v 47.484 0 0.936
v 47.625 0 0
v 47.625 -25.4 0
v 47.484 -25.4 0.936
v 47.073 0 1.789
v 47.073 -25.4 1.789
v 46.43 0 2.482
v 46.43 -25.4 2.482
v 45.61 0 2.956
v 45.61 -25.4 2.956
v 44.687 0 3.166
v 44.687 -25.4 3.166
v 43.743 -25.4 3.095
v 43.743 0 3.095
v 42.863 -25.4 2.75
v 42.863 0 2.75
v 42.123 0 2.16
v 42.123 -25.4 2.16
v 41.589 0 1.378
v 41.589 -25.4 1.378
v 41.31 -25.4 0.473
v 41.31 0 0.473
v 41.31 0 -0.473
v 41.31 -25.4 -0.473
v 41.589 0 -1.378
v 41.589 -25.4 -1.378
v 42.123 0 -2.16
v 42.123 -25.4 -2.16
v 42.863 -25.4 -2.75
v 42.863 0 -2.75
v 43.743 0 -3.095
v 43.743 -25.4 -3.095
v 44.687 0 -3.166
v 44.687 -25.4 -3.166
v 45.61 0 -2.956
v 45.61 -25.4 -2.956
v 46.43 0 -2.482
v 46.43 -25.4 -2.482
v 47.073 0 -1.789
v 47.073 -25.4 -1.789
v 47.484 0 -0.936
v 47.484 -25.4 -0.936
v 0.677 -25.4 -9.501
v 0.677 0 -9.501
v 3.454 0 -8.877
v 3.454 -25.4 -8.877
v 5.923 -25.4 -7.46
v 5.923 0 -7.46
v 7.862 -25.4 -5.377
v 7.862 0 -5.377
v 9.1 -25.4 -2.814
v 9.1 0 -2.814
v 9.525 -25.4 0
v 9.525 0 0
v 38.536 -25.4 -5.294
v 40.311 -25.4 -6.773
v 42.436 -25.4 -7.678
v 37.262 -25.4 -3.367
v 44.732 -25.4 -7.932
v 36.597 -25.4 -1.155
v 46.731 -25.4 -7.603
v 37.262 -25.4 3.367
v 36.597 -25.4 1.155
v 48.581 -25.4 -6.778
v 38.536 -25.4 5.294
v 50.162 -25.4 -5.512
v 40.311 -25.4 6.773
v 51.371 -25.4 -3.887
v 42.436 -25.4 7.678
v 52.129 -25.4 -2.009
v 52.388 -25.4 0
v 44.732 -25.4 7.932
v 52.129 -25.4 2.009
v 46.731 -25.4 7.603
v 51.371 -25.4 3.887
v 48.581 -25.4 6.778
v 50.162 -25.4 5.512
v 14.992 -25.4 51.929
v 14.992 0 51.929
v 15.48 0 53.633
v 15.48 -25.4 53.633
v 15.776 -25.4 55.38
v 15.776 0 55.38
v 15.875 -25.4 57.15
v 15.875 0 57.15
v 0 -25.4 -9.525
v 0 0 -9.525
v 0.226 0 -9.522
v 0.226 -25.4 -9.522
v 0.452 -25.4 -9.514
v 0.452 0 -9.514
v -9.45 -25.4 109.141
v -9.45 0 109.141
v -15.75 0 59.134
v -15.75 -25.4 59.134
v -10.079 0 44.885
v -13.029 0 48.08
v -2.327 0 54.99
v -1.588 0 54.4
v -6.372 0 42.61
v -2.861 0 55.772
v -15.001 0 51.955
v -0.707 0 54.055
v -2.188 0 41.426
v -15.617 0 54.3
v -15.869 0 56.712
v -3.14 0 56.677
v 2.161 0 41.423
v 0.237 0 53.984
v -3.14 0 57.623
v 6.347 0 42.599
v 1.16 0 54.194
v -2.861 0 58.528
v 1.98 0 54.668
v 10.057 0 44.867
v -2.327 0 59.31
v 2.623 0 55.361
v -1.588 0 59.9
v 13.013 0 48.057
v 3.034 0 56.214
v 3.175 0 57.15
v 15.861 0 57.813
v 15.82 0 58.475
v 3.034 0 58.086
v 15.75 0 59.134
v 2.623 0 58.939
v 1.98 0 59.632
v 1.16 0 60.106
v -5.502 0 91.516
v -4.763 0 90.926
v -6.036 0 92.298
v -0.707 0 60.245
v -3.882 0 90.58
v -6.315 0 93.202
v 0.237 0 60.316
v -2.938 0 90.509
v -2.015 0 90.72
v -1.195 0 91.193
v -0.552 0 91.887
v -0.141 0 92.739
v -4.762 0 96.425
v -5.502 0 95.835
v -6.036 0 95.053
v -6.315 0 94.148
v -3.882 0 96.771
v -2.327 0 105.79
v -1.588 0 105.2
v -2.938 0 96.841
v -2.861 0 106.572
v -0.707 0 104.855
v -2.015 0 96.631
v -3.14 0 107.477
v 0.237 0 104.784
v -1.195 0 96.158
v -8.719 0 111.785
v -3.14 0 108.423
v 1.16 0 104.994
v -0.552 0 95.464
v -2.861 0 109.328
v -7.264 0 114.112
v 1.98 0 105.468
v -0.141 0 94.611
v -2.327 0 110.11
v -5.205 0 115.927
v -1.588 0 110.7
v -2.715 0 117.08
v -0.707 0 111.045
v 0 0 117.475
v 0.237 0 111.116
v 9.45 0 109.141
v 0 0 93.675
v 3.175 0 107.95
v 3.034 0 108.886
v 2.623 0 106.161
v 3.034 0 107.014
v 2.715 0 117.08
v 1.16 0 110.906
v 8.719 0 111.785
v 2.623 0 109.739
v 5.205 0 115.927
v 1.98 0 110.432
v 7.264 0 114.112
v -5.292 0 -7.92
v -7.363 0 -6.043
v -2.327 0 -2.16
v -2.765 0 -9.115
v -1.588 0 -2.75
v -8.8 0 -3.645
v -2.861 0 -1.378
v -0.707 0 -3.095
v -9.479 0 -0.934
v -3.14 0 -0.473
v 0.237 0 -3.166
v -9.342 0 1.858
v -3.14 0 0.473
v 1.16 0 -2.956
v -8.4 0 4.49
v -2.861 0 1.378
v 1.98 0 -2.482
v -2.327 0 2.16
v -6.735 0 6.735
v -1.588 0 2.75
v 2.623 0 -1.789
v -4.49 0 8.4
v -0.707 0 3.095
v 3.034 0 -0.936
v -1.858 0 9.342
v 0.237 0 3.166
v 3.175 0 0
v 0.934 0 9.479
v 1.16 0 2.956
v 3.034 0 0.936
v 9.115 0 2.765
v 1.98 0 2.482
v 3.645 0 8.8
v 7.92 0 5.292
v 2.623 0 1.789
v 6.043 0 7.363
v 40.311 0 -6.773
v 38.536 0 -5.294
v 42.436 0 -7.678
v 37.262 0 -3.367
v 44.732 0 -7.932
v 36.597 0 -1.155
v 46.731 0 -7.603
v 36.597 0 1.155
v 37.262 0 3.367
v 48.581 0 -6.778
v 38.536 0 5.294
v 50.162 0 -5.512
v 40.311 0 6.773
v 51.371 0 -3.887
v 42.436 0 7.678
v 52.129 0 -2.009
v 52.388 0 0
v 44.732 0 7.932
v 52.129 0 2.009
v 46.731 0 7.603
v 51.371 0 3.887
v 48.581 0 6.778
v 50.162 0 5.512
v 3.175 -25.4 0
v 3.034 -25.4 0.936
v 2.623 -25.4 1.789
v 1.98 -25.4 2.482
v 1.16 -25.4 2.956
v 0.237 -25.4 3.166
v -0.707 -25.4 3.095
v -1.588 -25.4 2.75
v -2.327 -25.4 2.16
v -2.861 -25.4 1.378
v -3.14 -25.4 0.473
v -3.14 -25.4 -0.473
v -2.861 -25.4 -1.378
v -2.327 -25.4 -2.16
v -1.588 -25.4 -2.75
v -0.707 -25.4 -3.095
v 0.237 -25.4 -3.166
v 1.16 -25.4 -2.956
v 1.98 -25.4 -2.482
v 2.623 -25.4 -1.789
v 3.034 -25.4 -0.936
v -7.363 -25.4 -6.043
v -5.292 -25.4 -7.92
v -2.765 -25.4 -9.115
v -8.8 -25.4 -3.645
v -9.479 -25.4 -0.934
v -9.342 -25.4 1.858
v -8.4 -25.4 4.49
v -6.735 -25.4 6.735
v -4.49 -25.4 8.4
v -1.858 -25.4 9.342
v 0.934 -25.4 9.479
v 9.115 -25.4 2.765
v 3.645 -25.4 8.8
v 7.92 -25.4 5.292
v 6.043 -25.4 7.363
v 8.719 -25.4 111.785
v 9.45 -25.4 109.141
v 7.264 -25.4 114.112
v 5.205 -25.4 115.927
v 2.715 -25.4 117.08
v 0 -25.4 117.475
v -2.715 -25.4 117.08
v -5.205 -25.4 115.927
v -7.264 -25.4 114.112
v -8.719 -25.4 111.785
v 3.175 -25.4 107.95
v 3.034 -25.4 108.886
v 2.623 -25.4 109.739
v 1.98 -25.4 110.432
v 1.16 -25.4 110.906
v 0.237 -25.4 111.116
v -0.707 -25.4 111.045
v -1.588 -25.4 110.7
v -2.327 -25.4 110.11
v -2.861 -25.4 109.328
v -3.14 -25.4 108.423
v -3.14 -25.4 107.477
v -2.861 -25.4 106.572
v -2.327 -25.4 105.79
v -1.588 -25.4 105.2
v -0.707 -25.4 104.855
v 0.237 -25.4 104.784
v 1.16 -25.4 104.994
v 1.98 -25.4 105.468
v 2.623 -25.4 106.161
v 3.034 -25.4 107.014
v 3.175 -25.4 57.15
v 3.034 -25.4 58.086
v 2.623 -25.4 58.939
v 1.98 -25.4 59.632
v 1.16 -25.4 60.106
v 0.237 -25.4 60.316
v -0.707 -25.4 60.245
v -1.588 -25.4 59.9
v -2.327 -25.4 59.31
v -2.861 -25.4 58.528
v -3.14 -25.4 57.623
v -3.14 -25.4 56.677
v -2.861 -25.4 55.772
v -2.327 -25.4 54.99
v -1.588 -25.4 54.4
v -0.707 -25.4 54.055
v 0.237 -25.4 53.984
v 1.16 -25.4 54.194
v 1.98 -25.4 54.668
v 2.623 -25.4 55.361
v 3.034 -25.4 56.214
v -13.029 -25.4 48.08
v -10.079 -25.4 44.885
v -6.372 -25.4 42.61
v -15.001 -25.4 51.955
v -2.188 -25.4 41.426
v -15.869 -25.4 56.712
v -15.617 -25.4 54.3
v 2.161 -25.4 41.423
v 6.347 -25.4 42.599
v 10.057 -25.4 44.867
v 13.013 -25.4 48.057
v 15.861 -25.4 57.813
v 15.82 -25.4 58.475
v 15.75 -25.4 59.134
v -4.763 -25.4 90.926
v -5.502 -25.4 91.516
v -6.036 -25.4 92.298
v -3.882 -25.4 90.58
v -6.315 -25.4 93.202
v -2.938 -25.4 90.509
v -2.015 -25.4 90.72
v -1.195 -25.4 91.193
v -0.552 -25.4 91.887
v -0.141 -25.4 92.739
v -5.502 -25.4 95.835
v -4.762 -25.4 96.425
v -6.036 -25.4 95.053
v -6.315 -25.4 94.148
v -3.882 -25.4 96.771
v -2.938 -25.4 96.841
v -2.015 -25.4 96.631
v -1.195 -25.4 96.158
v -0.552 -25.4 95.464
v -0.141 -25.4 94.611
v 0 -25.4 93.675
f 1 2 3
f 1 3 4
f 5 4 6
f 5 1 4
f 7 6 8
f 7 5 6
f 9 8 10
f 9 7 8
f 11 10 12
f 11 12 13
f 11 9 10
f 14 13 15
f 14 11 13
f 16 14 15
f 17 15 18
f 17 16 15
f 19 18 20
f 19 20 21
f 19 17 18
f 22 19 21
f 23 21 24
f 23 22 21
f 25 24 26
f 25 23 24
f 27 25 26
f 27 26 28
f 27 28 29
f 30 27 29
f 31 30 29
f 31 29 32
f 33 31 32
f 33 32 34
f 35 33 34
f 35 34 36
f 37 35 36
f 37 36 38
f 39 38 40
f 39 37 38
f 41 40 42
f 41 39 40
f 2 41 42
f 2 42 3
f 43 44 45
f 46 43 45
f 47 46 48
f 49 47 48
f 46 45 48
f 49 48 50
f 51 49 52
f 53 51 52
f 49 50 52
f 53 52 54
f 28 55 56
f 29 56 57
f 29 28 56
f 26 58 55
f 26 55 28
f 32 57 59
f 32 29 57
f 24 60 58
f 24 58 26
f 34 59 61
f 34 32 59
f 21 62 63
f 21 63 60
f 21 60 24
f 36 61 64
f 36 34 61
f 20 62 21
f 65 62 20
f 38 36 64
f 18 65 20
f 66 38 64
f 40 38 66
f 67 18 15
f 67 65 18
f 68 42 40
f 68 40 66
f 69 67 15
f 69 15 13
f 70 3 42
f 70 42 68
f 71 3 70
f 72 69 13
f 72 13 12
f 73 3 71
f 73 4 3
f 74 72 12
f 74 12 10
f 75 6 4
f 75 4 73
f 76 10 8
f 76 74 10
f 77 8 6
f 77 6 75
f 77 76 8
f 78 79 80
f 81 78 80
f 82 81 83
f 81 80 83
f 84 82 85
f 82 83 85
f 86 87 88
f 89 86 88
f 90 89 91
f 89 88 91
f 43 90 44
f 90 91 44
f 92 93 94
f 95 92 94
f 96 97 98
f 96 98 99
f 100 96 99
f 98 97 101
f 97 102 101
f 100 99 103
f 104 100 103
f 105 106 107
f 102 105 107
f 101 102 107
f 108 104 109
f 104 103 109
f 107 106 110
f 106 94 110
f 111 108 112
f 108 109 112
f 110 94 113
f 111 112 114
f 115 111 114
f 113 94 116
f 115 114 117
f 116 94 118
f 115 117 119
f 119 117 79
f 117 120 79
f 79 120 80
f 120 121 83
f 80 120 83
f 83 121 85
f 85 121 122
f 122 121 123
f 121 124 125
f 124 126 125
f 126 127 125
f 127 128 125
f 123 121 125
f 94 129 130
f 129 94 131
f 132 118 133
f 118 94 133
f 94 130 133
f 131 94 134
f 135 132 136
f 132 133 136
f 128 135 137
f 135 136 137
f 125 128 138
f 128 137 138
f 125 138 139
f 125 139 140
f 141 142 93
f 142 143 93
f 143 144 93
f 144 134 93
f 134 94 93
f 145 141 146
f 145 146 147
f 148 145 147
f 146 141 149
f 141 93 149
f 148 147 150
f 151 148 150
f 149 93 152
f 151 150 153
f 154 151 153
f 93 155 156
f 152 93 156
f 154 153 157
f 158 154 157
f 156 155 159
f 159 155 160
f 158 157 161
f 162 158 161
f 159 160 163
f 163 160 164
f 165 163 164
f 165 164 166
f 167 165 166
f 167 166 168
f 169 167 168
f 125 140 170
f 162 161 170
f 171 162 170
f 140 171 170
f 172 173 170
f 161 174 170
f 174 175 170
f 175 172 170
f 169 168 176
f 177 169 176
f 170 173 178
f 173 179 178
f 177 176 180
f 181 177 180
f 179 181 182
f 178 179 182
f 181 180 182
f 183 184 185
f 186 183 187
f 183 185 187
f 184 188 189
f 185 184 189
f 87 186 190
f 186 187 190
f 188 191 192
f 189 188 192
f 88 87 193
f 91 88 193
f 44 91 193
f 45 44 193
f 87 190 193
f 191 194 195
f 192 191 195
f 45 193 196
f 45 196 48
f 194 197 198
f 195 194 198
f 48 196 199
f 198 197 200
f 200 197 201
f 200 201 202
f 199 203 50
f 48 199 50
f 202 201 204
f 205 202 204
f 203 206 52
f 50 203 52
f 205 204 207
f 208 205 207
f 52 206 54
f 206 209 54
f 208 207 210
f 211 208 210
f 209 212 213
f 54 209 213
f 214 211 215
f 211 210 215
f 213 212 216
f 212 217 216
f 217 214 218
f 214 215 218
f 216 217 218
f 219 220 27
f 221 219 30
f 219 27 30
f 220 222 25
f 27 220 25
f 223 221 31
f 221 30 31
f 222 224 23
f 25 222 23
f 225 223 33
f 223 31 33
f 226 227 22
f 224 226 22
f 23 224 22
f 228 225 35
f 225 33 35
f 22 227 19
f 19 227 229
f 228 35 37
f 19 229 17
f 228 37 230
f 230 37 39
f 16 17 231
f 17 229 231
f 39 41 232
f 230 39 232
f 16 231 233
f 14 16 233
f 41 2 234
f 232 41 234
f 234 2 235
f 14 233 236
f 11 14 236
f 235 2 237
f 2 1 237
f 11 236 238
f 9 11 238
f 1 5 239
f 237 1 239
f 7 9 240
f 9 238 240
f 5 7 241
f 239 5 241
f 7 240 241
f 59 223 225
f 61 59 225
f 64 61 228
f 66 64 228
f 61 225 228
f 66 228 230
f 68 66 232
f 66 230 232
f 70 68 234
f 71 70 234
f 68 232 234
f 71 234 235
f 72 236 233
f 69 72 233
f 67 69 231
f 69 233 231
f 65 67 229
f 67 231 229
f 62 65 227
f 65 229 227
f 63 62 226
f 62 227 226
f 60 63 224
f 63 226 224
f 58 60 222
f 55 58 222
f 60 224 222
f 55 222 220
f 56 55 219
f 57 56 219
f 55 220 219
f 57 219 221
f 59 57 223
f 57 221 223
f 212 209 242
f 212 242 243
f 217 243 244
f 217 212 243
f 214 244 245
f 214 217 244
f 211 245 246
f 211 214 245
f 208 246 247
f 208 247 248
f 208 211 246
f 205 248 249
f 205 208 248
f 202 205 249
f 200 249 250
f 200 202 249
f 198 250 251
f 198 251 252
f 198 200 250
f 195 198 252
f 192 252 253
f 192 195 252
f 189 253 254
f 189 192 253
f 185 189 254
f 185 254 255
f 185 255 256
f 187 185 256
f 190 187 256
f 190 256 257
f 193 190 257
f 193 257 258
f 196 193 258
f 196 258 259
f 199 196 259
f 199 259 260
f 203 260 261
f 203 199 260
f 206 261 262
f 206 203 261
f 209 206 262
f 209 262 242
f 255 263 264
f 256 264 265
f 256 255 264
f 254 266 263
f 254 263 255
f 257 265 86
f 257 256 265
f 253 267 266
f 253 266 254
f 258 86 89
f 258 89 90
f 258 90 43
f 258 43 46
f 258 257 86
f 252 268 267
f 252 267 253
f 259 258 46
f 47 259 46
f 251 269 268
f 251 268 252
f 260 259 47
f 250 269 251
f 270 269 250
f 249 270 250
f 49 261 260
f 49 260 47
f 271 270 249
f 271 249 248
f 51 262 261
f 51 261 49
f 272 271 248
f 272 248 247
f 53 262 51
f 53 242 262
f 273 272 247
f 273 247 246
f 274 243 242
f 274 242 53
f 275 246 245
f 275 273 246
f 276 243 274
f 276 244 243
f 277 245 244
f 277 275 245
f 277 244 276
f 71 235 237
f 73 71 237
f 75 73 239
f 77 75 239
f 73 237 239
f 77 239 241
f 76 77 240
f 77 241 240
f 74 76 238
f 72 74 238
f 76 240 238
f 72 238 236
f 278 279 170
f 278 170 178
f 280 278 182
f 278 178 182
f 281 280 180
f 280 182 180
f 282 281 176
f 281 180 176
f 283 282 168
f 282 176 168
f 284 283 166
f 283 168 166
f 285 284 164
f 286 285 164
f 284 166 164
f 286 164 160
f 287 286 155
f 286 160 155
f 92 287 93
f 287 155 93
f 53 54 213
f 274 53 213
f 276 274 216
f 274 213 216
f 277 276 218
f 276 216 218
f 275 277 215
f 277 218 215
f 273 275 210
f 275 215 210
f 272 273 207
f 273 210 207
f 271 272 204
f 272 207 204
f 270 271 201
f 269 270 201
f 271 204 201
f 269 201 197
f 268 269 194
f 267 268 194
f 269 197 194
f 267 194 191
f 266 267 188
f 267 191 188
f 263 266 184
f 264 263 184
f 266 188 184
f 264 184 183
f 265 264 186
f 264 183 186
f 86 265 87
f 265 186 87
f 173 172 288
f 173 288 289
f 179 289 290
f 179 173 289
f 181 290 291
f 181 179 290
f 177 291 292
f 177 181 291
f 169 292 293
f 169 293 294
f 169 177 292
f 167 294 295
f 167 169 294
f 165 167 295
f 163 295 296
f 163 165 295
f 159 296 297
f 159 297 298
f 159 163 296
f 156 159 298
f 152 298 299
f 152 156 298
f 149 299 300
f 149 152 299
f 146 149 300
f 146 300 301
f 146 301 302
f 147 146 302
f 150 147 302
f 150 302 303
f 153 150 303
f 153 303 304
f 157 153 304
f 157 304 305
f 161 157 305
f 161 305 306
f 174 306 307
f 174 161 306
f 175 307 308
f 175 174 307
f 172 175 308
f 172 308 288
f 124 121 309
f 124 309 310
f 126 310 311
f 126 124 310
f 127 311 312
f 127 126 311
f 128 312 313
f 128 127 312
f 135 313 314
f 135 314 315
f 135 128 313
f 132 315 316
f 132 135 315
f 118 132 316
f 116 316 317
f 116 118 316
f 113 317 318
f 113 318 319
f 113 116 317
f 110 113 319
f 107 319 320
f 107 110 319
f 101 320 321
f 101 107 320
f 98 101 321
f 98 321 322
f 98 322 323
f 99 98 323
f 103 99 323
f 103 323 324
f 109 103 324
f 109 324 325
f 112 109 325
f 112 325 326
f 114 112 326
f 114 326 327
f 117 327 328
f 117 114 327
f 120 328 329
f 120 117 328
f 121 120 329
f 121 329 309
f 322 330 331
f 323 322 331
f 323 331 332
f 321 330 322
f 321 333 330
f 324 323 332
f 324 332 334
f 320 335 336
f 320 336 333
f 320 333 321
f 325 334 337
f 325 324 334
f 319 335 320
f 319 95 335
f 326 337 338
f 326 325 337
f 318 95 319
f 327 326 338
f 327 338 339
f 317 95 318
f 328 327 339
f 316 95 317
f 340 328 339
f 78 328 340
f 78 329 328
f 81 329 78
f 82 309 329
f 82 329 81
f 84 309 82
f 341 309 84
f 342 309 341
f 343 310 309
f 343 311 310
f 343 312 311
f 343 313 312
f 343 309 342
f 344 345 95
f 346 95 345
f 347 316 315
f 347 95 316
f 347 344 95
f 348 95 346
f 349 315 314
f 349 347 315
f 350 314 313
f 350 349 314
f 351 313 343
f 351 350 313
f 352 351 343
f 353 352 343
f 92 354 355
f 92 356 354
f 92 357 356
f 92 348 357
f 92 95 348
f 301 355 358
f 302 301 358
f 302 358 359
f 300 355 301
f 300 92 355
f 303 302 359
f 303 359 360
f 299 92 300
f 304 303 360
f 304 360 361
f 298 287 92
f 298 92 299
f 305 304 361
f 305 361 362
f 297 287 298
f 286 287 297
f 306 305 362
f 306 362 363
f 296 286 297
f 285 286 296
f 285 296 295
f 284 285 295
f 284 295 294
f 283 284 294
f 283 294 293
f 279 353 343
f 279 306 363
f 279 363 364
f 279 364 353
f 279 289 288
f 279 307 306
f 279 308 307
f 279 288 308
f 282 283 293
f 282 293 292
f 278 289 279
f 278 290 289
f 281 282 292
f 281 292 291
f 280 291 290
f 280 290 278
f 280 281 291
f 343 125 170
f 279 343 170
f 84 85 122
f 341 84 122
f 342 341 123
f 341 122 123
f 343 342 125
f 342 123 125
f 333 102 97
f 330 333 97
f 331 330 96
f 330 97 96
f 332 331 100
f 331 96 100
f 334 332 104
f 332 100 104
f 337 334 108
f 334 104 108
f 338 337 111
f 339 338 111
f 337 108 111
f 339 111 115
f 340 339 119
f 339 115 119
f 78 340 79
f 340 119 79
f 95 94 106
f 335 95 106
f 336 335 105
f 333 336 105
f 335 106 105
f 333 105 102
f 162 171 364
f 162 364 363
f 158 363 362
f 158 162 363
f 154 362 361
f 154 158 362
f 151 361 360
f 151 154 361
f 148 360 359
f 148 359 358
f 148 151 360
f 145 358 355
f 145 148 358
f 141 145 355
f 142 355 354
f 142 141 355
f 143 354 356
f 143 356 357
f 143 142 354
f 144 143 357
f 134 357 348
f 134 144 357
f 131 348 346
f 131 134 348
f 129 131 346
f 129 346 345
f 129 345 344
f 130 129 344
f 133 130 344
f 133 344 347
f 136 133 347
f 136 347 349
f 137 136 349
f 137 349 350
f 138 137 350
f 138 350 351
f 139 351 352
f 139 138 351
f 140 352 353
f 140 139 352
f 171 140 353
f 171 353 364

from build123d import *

# Parameters (mm, degrees)
F0_R     = 3.175
F1_DEPTH = 25.4


with BuildPart() as f1:
    # F0 (on Front) → F1 (new body)
    with BuildSketch(Plane.XZ):
        with BuildLine():
            ThreePointArc((-9.450293, 109.140625), (-0.596483, 98.443695), (9.525, 107.95))
            ThreePointArc((9.525, 107.95), (9.506305, 108.546483), (9.450293, 109.140625))
            ThreePointArc((9.450293, 109.140625), (0, 117.475), (-9.450293, 109.140625))
        make_face()
        with Locations((0, 107.95)):
            Circle(F0_R, mode=Mode.SUBTRACT)
        with BuildLine():
            ThreePointArc((9.450293, 109.140625), (9.506305, 108.546483), (9.525, 107.95))
            ThreePointArc((9.525, 107.95), (-0.596483, 98.443695), (-9.450293, 109.140625))
            Line((-9.450293, 109.140625), (-15.750488, 59.134375))
            ThreePointArc((-15.750488, 59.134375), (0, 73.025), (15.750488, 59.134375))
            Line((15.750488, 59.134375), (9.450293, 109.140625))
        make_face()
        with Locations((-3.175, 93.6752)):
            Circle(F0_R, mode=Mode.SUBTRACT)
        with BuildLine():
            ThreePointArc((0, -9.525), (0.338886, -9.51897), (0.677344, -9.500886))
            Line((0.677344, -9.500886), (0, -9.525))
        make_face()
        with BuildLine():
            Line((0, -9.525), (0.677344, -9.500886))
            ThreePointArc((0.677344, -9.500886), (6.970557, -6.491299), (9.525, 0))
            ThreePointArc((9.525, 0), (-6.735192, 6.735192), (0, -9.525))
        make_face()
        Circle(F0_R, mode=Mode.SUBTRACT)
        with BuildLine():
            ThreePointArc((52.3875, 0), (50.161633, 5.51191), (44.732405, 7.932475))
            ThreePointArc((44.732405, 7.932475), (36.5125, 0), (44.732405, -7.932475))
            ThreePointArc((44.732405, -7.932475), (50.161633, -5.51191), (52.3875, 0))
        make_face()
        with Locations((44.45, 0)):
            Circle(F0_R, mode=Mode.SUBTRACT)
        with BuildLine():
            Line((14.991944, 51.929155), (15.750488, 59.134375))
            ThreePointArc((15.750488, 59.134375), (0, 73.025), (-15.750488, 59.134375))
            Line((-15.750488, 59.134375), (-15.000964, 51.955126))
            ThreePointArc((-15.000964, 51.955126), (-0.013747, 41.275006), (14.991944, 51.929155))
        make_face()
        with Locations((0, 57.15)):
            Circle(F0_R, mode=Mode.SUBTRACT)
        with BuildLine():
            ThreePointArc((15.875, 57.15), (15.843841, 58.144139), (15.750488, 59.134375))
            Line((15.750488, 59.134375), (14.991944, 51.929155))
            ThreePointArc((14.991944, 51.929155), (15.652679, 54.502501), (15.875, 57.15))
        make_face()
        with BuildLine():
            Line((-15.000964, 51.955126), (-15.750488, 59.134375))
            ThreePointArc((-15.750488, 59.134375), (-15.789185, 55.501585), (-15.000964, 51.955126))
        make_face()
    extrude(amount=F1_DEPTH)


solid = f1.part
